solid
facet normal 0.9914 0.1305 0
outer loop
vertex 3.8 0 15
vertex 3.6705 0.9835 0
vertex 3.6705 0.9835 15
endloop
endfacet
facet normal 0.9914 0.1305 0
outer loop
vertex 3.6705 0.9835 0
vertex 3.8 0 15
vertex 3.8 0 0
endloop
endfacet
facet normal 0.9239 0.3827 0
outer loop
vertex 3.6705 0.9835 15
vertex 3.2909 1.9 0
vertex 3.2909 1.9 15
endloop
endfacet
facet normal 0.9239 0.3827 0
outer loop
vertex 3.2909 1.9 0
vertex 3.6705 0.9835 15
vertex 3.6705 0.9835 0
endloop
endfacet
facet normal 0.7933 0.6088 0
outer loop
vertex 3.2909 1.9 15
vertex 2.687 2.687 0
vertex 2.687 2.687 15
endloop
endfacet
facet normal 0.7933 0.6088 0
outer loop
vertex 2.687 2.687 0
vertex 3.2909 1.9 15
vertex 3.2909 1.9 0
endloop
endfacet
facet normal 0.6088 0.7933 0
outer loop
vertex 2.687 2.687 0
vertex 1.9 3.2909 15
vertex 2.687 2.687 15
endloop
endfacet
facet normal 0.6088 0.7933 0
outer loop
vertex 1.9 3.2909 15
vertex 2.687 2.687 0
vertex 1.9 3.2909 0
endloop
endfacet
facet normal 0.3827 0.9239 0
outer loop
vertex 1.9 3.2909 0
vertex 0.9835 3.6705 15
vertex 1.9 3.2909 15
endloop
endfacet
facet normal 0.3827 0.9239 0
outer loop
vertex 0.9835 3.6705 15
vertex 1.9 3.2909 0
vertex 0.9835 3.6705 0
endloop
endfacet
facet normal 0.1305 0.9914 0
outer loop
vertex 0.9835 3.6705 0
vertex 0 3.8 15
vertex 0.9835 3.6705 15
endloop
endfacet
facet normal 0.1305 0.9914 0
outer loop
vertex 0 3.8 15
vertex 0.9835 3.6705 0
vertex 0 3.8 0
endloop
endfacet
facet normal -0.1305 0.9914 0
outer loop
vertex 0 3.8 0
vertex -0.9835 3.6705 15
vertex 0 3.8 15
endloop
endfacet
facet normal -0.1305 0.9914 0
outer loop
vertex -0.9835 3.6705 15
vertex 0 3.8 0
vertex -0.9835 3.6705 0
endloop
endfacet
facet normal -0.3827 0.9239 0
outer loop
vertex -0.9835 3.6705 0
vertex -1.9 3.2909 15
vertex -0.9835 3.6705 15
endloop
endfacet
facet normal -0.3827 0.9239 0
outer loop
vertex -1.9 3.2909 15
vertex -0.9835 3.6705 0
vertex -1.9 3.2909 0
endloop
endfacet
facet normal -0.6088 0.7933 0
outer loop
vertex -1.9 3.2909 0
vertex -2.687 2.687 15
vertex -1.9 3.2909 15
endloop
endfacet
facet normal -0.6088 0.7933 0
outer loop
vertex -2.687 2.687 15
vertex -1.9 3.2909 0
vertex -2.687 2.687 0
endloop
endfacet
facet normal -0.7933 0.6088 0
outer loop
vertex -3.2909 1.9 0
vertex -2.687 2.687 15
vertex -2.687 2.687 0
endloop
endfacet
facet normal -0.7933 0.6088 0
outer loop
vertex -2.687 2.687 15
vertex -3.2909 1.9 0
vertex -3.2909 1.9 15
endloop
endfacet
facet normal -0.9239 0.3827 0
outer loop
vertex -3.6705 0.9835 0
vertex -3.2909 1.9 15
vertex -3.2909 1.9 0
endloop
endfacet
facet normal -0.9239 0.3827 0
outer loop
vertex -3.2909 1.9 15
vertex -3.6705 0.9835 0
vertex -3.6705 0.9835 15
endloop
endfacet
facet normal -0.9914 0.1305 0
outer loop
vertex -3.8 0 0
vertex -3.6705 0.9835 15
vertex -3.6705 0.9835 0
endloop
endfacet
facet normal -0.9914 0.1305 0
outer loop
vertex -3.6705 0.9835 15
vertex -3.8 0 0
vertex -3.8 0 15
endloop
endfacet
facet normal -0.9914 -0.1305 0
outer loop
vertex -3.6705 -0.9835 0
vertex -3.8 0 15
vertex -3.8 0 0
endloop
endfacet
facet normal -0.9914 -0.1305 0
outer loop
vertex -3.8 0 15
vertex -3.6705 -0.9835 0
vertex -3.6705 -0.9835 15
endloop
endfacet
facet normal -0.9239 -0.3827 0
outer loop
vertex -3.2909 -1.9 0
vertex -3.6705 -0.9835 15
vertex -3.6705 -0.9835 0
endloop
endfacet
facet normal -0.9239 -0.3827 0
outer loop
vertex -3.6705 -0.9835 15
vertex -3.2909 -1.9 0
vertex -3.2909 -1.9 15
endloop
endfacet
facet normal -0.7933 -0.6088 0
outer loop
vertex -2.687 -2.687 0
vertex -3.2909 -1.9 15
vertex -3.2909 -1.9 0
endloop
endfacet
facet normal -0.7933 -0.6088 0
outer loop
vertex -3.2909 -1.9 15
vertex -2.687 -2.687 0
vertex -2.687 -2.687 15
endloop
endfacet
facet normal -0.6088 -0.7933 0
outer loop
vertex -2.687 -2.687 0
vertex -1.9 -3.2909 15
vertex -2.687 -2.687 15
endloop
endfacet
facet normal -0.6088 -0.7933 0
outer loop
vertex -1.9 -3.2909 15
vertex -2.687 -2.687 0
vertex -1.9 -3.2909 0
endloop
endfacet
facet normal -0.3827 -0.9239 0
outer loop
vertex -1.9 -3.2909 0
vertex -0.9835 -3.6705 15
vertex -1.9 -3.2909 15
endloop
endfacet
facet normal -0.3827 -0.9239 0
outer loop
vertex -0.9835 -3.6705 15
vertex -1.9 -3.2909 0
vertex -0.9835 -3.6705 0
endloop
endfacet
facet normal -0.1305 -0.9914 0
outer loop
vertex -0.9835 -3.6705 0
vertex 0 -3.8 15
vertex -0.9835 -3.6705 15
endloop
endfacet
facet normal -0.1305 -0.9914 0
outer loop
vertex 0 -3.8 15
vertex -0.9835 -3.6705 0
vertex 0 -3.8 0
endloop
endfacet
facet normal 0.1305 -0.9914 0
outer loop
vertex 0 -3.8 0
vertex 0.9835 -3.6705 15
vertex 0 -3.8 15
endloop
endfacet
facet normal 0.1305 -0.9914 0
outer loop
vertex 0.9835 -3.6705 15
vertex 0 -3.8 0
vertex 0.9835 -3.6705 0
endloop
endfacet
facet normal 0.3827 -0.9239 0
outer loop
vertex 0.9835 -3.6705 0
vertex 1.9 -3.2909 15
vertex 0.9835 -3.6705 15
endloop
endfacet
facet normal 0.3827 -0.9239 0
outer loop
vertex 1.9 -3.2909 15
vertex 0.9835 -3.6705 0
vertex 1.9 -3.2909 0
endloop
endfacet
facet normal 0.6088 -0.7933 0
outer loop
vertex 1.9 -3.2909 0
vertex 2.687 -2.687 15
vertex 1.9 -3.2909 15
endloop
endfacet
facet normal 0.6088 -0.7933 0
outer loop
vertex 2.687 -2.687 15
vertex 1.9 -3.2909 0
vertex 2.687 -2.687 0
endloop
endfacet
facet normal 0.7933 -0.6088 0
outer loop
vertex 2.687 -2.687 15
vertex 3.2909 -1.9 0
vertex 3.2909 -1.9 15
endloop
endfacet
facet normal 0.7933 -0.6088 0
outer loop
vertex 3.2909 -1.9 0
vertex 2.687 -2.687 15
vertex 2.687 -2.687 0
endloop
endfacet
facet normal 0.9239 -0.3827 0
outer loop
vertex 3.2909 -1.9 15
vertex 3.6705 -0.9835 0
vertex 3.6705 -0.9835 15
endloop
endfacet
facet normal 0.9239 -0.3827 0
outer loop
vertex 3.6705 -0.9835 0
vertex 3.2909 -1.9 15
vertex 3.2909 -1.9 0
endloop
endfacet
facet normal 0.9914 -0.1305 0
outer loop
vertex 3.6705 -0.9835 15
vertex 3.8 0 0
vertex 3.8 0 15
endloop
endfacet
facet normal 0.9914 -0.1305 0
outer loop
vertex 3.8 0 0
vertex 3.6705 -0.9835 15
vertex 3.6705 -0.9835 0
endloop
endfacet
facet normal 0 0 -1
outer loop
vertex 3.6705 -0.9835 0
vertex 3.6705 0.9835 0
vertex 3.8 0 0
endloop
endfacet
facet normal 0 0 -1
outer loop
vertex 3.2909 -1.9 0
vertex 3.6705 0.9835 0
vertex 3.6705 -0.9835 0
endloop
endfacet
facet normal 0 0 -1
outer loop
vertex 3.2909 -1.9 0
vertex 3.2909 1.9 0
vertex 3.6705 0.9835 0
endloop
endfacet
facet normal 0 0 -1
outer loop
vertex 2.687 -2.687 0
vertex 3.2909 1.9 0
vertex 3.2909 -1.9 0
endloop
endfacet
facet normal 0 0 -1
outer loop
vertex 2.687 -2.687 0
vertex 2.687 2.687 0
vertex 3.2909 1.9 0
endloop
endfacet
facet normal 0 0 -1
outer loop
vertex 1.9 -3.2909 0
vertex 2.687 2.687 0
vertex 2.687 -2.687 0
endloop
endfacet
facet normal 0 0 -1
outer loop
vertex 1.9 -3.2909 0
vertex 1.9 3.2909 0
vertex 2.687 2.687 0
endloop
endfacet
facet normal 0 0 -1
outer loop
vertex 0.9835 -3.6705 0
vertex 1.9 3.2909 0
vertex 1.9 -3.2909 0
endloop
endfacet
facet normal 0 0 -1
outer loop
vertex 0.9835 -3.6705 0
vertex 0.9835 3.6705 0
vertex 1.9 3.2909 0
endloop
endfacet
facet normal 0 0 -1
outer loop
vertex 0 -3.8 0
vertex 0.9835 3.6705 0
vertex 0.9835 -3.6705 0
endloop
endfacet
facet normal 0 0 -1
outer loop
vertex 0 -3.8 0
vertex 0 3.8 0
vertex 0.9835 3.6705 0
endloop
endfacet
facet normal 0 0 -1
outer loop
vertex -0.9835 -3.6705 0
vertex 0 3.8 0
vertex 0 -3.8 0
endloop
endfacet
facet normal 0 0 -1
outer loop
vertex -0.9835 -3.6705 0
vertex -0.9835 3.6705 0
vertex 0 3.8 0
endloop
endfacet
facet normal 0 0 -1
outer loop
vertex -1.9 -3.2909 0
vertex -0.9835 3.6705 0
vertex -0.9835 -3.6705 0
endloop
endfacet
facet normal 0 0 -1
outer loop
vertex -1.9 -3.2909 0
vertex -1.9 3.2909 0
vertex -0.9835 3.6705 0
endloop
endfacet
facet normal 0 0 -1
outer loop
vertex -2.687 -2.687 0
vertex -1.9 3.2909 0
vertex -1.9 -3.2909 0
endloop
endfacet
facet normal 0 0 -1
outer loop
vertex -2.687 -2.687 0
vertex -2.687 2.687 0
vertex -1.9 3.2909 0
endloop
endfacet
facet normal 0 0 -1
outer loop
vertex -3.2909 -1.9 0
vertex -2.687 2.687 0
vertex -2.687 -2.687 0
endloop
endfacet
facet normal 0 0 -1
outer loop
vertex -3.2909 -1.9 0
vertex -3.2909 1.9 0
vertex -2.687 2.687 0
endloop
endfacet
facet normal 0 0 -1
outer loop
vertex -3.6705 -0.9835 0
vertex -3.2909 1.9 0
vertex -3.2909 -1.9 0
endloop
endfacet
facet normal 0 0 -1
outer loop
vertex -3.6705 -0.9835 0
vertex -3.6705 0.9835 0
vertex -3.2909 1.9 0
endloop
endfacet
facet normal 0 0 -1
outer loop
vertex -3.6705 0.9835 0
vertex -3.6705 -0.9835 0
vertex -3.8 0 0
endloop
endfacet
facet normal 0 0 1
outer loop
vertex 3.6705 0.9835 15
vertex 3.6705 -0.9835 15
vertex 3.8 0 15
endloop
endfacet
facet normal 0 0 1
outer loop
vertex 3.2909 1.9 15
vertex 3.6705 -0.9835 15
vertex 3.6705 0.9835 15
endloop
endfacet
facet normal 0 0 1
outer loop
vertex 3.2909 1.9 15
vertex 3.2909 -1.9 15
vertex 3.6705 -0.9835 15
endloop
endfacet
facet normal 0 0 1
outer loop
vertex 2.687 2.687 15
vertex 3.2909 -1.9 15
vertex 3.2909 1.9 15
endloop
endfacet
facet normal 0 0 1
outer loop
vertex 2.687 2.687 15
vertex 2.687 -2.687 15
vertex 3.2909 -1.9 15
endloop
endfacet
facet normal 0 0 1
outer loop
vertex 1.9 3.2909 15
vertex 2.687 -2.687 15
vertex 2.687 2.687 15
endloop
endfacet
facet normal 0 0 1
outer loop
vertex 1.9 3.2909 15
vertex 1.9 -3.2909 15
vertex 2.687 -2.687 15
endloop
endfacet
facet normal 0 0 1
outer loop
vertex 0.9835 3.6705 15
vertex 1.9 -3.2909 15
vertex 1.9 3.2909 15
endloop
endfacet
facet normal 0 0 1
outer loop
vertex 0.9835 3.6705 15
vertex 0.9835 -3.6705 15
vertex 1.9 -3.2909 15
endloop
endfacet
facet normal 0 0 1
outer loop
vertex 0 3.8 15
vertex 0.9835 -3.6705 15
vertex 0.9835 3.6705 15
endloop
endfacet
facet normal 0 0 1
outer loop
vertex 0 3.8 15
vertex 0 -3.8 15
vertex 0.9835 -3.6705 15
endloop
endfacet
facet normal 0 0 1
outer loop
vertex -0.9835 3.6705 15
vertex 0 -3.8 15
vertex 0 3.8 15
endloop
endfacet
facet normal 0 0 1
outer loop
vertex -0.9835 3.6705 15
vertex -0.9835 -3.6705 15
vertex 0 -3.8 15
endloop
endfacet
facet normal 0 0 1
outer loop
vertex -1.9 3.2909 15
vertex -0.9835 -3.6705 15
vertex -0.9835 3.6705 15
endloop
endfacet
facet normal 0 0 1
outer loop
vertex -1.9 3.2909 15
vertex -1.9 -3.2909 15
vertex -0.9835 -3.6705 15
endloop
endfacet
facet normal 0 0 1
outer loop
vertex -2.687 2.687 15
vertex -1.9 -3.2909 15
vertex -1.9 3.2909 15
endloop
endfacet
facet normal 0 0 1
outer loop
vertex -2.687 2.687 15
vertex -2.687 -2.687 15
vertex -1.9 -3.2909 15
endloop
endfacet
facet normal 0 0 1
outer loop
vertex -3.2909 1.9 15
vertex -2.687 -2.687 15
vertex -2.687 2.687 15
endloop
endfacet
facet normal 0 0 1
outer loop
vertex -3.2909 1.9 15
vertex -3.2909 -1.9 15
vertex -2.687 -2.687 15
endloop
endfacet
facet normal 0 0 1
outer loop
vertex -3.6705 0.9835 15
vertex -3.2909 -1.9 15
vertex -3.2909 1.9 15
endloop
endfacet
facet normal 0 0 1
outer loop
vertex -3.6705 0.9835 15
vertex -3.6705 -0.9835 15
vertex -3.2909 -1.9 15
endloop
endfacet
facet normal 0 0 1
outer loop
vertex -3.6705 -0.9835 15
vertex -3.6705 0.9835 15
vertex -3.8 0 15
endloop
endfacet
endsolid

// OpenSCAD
// Alignment peg — prints 3× per joint
// d=7.6mm (0.4mm loose fit into 8mm holes), h=15mm (7.5mm each side)
// Use: push into base plate holes, set pedestal on top

$fn = 24;
cylinder(d=7.6, h=15);
